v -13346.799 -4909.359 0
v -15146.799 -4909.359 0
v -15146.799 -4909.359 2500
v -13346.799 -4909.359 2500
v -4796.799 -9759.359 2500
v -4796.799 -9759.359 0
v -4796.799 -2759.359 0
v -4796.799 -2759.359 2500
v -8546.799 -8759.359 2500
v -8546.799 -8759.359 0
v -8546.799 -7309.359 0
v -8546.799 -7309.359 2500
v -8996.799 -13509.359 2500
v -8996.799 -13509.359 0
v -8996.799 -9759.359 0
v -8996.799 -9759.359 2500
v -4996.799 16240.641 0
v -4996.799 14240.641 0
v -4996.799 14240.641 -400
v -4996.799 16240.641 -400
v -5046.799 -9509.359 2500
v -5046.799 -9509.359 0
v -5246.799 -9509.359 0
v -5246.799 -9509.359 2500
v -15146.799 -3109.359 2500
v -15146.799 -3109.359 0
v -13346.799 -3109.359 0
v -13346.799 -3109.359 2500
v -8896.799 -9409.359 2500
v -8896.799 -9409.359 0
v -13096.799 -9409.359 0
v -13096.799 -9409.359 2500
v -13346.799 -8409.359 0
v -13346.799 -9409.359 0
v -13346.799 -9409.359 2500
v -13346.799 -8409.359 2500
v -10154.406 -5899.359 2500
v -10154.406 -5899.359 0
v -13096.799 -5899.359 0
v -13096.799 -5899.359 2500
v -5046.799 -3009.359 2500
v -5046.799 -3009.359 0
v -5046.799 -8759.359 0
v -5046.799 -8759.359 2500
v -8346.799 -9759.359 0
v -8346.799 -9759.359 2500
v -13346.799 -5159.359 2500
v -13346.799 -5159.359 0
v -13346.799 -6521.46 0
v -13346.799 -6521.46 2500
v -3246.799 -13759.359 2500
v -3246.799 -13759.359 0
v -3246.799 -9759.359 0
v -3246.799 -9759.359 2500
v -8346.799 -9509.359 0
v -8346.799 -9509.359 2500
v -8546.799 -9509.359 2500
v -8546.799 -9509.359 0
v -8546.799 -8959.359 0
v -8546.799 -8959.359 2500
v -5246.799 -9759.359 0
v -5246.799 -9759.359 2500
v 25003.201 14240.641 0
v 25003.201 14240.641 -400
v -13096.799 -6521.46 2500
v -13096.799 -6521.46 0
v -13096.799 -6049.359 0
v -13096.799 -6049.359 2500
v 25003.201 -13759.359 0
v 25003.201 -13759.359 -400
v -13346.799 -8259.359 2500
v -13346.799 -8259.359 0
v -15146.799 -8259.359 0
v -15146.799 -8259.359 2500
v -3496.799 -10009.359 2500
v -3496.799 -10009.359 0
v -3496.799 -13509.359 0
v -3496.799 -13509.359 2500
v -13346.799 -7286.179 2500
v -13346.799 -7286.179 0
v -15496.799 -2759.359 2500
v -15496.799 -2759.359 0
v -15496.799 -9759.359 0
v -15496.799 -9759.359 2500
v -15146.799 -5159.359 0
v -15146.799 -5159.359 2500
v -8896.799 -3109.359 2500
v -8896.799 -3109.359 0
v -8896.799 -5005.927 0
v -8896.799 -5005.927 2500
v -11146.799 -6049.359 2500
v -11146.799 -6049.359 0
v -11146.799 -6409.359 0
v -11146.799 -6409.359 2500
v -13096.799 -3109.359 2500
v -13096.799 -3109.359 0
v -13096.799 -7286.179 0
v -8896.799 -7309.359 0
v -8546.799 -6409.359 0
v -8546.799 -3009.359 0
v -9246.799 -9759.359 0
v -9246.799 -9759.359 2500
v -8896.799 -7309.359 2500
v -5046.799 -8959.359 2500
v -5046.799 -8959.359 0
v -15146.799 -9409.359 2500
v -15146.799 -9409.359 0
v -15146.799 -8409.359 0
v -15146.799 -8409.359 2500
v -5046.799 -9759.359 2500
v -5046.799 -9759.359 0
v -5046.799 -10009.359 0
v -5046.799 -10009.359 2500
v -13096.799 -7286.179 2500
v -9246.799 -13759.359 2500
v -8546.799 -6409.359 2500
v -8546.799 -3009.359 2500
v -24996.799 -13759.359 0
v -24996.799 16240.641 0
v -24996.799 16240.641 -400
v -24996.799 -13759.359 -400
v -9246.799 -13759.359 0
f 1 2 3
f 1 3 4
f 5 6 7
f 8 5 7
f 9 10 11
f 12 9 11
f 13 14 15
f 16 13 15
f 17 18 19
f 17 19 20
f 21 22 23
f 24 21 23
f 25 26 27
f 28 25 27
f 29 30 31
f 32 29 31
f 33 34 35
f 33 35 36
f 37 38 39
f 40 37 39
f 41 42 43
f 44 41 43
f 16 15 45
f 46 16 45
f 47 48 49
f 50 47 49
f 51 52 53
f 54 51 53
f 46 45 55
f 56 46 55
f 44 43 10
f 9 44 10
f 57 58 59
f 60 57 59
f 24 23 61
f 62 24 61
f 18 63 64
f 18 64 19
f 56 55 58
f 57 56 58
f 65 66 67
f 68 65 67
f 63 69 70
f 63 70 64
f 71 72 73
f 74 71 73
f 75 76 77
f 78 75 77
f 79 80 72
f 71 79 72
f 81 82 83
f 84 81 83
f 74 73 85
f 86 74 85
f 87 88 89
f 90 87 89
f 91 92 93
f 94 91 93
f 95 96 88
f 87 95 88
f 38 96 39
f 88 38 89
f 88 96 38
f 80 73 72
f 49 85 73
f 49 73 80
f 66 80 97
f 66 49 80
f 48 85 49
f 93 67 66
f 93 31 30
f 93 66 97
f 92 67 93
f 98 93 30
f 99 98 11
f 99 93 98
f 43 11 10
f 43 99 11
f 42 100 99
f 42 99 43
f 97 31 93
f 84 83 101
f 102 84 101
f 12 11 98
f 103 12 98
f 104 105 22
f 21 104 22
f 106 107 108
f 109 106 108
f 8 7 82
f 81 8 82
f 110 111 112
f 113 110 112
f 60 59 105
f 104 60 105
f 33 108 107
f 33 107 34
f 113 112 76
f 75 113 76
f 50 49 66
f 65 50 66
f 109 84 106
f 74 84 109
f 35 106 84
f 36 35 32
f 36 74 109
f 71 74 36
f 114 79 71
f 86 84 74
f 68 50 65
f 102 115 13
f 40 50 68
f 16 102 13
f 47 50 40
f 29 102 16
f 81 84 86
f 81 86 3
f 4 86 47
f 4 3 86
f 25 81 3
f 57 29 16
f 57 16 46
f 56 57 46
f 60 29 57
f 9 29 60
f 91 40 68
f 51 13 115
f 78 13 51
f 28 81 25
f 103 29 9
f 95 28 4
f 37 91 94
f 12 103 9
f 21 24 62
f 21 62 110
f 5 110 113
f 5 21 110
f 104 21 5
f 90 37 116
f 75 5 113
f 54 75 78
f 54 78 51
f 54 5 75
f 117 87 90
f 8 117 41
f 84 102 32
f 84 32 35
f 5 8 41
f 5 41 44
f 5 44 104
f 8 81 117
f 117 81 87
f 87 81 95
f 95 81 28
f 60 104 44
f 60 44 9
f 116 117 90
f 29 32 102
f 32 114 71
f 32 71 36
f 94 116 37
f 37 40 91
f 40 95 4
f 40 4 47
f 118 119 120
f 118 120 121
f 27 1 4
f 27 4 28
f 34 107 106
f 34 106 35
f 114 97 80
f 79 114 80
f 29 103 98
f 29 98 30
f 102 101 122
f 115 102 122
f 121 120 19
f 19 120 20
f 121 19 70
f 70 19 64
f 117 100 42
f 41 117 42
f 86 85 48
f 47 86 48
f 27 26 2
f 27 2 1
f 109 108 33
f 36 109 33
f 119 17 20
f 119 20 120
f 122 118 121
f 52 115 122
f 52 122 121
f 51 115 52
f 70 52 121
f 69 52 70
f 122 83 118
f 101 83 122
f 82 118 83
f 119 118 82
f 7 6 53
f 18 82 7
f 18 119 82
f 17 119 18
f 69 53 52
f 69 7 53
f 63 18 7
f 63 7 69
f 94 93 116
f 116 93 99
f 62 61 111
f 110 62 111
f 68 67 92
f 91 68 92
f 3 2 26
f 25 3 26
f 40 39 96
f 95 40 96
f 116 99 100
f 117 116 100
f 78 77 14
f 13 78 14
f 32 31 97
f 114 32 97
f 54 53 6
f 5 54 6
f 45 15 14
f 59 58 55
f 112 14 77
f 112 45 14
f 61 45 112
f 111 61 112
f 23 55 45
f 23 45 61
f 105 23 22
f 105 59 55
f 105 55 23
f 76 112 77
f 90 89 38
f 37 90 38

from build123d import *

# Parameters (mm, degrees)
F1_DEPTH = 400
F2_W     = 1800
F2_H     = 1000
F2_H_2   = 1800
F3_DEPTH = 2500


# Not quite as in the source:
# - a feature names something its author has since deleted; it is built from what else it names


with BuildPart() as f1:
    # F0 (on Top) → F1 (new body)
    with BuildSketch(Plane.XY):
        Polygon((-4996.7988580465, 16240.6410978539), (-24996.7988580465, 16240.6410978539), (-24996.7988580465, -13759.3589021461), (25003.2011419535, -13759.3589021461), (25003.2011419535, 14240.641097854), (-4996.7988580465, 14240.6410978539), align=None)
    extrude(amount=-F1_DEPTH)

    # F2 (on face) → F3 (join)
    with BuildSketch(Plane.XY):
        Polygon((-8546.7988580465, -2759.3589021461), (-15496.7988580465, -2759.3589021461), (-15496.7988580465, -9759.3589021461), (-9246.7988580465, -9759.3589021461), (-9246.7988580465, -13759.3589021461), (-3246.7988580465, -13759.3589021461), (-3246.7988580465, -9759.3589021461), (-4796.7988580465, -9759.3589021461), (-4796.7988580465, -3009.3589021461), (-4796.7988580465, -2759.3589021461), align=None)
        with Locations((-14246.7988580465, -8909.3589021461)):
            Rectangle(F2_W, F2_H, mode=Mode.SUBTRACT)
        Polygon((-8996.7988580465, -13509.3589021461), (-8996.7988580465, -9759.3589021461), (-8546.7988580465, -9759.3589021461), (-8346.7988580465, -9759.3589021461), (-8346.7988580465, -9509.3589021461), (-8546.7988580465, -9509.3589021461), (-8546.7988580465, -8959.3589021461), (-5046.7988580465, -8959.3589021461), (-5046.7988580465, -9509.3589021461), (-5246.7988580465, -9509.3589021461), (-5246.7988580465, -9759.3589021461), (-5046.7988580465, -9759.3589021461), (-5046.7988580465, -10009.3589021461), (-4796.7988580465, -10009.3589021461), (-3496.7988580465, -10009.3589021461), (-3496.7988580465, -13509.3589021461), align=None, mode=Mode.SUBTRACT)
        with Locations((-14246.7988580465, -4009.3589021461)):
            Rectangle(F2_W, F2_H_2, mode=Mode.SUBTRACT)
        Polygon((-8546.7988580465, -3009.3589021461), (-5046.7988580465, -3009.3589021461), (-5046.7988580465, -8759.3589021461), (-8546.7988580465, -8759.3589021461), (-8546.7988580465, -7309.3589021461), (-8896.7988580465, -7309.3589021461), (-8896.7988580465, -9409.3589021461), (-12196.7988580465, -9409.3589021461), (-13096.7988580465, -9409.3589021461), (-13096.7988580465, -8109.3589021461), (-13096.7988580465, -7286.1785888672), (-13346.7988580465, -7286.1785888672), (-13346.7988580465, -8259.3589021461), (-15146.7988580465, -8259.3589021461), (-15146.7988580465, -5159.3589021461), (-13346.7988580465, -5159.3589021461), (-13346.7988580465, -6521.4600563049), (-13096.7988580465, -6521.4600563049), (-13096.7988580465, -6049.3589021461), (-11146.7988580465, -6049.3589021461), (-11146.7988580465, -6409.3589021461), (-8896.7988580465, -6409.3589021461), (-8546.7988580465, -6409.3589021461), align=None, mode=Mode.SUBTRACT)
        Polygon((-8896.7988580465, -3109.3589021461), (-8896.7988580465, -5005.9270858765), (-10154.4055938721, -5899.3589021461), (-13096.7988580465, -5899.3589021461), (-13096.7988580465, -3109.3589021461), align=None, mode=Mode.SUBTRACT)
    extrude(amount=F3_DEPTH)


solid = f1.part
